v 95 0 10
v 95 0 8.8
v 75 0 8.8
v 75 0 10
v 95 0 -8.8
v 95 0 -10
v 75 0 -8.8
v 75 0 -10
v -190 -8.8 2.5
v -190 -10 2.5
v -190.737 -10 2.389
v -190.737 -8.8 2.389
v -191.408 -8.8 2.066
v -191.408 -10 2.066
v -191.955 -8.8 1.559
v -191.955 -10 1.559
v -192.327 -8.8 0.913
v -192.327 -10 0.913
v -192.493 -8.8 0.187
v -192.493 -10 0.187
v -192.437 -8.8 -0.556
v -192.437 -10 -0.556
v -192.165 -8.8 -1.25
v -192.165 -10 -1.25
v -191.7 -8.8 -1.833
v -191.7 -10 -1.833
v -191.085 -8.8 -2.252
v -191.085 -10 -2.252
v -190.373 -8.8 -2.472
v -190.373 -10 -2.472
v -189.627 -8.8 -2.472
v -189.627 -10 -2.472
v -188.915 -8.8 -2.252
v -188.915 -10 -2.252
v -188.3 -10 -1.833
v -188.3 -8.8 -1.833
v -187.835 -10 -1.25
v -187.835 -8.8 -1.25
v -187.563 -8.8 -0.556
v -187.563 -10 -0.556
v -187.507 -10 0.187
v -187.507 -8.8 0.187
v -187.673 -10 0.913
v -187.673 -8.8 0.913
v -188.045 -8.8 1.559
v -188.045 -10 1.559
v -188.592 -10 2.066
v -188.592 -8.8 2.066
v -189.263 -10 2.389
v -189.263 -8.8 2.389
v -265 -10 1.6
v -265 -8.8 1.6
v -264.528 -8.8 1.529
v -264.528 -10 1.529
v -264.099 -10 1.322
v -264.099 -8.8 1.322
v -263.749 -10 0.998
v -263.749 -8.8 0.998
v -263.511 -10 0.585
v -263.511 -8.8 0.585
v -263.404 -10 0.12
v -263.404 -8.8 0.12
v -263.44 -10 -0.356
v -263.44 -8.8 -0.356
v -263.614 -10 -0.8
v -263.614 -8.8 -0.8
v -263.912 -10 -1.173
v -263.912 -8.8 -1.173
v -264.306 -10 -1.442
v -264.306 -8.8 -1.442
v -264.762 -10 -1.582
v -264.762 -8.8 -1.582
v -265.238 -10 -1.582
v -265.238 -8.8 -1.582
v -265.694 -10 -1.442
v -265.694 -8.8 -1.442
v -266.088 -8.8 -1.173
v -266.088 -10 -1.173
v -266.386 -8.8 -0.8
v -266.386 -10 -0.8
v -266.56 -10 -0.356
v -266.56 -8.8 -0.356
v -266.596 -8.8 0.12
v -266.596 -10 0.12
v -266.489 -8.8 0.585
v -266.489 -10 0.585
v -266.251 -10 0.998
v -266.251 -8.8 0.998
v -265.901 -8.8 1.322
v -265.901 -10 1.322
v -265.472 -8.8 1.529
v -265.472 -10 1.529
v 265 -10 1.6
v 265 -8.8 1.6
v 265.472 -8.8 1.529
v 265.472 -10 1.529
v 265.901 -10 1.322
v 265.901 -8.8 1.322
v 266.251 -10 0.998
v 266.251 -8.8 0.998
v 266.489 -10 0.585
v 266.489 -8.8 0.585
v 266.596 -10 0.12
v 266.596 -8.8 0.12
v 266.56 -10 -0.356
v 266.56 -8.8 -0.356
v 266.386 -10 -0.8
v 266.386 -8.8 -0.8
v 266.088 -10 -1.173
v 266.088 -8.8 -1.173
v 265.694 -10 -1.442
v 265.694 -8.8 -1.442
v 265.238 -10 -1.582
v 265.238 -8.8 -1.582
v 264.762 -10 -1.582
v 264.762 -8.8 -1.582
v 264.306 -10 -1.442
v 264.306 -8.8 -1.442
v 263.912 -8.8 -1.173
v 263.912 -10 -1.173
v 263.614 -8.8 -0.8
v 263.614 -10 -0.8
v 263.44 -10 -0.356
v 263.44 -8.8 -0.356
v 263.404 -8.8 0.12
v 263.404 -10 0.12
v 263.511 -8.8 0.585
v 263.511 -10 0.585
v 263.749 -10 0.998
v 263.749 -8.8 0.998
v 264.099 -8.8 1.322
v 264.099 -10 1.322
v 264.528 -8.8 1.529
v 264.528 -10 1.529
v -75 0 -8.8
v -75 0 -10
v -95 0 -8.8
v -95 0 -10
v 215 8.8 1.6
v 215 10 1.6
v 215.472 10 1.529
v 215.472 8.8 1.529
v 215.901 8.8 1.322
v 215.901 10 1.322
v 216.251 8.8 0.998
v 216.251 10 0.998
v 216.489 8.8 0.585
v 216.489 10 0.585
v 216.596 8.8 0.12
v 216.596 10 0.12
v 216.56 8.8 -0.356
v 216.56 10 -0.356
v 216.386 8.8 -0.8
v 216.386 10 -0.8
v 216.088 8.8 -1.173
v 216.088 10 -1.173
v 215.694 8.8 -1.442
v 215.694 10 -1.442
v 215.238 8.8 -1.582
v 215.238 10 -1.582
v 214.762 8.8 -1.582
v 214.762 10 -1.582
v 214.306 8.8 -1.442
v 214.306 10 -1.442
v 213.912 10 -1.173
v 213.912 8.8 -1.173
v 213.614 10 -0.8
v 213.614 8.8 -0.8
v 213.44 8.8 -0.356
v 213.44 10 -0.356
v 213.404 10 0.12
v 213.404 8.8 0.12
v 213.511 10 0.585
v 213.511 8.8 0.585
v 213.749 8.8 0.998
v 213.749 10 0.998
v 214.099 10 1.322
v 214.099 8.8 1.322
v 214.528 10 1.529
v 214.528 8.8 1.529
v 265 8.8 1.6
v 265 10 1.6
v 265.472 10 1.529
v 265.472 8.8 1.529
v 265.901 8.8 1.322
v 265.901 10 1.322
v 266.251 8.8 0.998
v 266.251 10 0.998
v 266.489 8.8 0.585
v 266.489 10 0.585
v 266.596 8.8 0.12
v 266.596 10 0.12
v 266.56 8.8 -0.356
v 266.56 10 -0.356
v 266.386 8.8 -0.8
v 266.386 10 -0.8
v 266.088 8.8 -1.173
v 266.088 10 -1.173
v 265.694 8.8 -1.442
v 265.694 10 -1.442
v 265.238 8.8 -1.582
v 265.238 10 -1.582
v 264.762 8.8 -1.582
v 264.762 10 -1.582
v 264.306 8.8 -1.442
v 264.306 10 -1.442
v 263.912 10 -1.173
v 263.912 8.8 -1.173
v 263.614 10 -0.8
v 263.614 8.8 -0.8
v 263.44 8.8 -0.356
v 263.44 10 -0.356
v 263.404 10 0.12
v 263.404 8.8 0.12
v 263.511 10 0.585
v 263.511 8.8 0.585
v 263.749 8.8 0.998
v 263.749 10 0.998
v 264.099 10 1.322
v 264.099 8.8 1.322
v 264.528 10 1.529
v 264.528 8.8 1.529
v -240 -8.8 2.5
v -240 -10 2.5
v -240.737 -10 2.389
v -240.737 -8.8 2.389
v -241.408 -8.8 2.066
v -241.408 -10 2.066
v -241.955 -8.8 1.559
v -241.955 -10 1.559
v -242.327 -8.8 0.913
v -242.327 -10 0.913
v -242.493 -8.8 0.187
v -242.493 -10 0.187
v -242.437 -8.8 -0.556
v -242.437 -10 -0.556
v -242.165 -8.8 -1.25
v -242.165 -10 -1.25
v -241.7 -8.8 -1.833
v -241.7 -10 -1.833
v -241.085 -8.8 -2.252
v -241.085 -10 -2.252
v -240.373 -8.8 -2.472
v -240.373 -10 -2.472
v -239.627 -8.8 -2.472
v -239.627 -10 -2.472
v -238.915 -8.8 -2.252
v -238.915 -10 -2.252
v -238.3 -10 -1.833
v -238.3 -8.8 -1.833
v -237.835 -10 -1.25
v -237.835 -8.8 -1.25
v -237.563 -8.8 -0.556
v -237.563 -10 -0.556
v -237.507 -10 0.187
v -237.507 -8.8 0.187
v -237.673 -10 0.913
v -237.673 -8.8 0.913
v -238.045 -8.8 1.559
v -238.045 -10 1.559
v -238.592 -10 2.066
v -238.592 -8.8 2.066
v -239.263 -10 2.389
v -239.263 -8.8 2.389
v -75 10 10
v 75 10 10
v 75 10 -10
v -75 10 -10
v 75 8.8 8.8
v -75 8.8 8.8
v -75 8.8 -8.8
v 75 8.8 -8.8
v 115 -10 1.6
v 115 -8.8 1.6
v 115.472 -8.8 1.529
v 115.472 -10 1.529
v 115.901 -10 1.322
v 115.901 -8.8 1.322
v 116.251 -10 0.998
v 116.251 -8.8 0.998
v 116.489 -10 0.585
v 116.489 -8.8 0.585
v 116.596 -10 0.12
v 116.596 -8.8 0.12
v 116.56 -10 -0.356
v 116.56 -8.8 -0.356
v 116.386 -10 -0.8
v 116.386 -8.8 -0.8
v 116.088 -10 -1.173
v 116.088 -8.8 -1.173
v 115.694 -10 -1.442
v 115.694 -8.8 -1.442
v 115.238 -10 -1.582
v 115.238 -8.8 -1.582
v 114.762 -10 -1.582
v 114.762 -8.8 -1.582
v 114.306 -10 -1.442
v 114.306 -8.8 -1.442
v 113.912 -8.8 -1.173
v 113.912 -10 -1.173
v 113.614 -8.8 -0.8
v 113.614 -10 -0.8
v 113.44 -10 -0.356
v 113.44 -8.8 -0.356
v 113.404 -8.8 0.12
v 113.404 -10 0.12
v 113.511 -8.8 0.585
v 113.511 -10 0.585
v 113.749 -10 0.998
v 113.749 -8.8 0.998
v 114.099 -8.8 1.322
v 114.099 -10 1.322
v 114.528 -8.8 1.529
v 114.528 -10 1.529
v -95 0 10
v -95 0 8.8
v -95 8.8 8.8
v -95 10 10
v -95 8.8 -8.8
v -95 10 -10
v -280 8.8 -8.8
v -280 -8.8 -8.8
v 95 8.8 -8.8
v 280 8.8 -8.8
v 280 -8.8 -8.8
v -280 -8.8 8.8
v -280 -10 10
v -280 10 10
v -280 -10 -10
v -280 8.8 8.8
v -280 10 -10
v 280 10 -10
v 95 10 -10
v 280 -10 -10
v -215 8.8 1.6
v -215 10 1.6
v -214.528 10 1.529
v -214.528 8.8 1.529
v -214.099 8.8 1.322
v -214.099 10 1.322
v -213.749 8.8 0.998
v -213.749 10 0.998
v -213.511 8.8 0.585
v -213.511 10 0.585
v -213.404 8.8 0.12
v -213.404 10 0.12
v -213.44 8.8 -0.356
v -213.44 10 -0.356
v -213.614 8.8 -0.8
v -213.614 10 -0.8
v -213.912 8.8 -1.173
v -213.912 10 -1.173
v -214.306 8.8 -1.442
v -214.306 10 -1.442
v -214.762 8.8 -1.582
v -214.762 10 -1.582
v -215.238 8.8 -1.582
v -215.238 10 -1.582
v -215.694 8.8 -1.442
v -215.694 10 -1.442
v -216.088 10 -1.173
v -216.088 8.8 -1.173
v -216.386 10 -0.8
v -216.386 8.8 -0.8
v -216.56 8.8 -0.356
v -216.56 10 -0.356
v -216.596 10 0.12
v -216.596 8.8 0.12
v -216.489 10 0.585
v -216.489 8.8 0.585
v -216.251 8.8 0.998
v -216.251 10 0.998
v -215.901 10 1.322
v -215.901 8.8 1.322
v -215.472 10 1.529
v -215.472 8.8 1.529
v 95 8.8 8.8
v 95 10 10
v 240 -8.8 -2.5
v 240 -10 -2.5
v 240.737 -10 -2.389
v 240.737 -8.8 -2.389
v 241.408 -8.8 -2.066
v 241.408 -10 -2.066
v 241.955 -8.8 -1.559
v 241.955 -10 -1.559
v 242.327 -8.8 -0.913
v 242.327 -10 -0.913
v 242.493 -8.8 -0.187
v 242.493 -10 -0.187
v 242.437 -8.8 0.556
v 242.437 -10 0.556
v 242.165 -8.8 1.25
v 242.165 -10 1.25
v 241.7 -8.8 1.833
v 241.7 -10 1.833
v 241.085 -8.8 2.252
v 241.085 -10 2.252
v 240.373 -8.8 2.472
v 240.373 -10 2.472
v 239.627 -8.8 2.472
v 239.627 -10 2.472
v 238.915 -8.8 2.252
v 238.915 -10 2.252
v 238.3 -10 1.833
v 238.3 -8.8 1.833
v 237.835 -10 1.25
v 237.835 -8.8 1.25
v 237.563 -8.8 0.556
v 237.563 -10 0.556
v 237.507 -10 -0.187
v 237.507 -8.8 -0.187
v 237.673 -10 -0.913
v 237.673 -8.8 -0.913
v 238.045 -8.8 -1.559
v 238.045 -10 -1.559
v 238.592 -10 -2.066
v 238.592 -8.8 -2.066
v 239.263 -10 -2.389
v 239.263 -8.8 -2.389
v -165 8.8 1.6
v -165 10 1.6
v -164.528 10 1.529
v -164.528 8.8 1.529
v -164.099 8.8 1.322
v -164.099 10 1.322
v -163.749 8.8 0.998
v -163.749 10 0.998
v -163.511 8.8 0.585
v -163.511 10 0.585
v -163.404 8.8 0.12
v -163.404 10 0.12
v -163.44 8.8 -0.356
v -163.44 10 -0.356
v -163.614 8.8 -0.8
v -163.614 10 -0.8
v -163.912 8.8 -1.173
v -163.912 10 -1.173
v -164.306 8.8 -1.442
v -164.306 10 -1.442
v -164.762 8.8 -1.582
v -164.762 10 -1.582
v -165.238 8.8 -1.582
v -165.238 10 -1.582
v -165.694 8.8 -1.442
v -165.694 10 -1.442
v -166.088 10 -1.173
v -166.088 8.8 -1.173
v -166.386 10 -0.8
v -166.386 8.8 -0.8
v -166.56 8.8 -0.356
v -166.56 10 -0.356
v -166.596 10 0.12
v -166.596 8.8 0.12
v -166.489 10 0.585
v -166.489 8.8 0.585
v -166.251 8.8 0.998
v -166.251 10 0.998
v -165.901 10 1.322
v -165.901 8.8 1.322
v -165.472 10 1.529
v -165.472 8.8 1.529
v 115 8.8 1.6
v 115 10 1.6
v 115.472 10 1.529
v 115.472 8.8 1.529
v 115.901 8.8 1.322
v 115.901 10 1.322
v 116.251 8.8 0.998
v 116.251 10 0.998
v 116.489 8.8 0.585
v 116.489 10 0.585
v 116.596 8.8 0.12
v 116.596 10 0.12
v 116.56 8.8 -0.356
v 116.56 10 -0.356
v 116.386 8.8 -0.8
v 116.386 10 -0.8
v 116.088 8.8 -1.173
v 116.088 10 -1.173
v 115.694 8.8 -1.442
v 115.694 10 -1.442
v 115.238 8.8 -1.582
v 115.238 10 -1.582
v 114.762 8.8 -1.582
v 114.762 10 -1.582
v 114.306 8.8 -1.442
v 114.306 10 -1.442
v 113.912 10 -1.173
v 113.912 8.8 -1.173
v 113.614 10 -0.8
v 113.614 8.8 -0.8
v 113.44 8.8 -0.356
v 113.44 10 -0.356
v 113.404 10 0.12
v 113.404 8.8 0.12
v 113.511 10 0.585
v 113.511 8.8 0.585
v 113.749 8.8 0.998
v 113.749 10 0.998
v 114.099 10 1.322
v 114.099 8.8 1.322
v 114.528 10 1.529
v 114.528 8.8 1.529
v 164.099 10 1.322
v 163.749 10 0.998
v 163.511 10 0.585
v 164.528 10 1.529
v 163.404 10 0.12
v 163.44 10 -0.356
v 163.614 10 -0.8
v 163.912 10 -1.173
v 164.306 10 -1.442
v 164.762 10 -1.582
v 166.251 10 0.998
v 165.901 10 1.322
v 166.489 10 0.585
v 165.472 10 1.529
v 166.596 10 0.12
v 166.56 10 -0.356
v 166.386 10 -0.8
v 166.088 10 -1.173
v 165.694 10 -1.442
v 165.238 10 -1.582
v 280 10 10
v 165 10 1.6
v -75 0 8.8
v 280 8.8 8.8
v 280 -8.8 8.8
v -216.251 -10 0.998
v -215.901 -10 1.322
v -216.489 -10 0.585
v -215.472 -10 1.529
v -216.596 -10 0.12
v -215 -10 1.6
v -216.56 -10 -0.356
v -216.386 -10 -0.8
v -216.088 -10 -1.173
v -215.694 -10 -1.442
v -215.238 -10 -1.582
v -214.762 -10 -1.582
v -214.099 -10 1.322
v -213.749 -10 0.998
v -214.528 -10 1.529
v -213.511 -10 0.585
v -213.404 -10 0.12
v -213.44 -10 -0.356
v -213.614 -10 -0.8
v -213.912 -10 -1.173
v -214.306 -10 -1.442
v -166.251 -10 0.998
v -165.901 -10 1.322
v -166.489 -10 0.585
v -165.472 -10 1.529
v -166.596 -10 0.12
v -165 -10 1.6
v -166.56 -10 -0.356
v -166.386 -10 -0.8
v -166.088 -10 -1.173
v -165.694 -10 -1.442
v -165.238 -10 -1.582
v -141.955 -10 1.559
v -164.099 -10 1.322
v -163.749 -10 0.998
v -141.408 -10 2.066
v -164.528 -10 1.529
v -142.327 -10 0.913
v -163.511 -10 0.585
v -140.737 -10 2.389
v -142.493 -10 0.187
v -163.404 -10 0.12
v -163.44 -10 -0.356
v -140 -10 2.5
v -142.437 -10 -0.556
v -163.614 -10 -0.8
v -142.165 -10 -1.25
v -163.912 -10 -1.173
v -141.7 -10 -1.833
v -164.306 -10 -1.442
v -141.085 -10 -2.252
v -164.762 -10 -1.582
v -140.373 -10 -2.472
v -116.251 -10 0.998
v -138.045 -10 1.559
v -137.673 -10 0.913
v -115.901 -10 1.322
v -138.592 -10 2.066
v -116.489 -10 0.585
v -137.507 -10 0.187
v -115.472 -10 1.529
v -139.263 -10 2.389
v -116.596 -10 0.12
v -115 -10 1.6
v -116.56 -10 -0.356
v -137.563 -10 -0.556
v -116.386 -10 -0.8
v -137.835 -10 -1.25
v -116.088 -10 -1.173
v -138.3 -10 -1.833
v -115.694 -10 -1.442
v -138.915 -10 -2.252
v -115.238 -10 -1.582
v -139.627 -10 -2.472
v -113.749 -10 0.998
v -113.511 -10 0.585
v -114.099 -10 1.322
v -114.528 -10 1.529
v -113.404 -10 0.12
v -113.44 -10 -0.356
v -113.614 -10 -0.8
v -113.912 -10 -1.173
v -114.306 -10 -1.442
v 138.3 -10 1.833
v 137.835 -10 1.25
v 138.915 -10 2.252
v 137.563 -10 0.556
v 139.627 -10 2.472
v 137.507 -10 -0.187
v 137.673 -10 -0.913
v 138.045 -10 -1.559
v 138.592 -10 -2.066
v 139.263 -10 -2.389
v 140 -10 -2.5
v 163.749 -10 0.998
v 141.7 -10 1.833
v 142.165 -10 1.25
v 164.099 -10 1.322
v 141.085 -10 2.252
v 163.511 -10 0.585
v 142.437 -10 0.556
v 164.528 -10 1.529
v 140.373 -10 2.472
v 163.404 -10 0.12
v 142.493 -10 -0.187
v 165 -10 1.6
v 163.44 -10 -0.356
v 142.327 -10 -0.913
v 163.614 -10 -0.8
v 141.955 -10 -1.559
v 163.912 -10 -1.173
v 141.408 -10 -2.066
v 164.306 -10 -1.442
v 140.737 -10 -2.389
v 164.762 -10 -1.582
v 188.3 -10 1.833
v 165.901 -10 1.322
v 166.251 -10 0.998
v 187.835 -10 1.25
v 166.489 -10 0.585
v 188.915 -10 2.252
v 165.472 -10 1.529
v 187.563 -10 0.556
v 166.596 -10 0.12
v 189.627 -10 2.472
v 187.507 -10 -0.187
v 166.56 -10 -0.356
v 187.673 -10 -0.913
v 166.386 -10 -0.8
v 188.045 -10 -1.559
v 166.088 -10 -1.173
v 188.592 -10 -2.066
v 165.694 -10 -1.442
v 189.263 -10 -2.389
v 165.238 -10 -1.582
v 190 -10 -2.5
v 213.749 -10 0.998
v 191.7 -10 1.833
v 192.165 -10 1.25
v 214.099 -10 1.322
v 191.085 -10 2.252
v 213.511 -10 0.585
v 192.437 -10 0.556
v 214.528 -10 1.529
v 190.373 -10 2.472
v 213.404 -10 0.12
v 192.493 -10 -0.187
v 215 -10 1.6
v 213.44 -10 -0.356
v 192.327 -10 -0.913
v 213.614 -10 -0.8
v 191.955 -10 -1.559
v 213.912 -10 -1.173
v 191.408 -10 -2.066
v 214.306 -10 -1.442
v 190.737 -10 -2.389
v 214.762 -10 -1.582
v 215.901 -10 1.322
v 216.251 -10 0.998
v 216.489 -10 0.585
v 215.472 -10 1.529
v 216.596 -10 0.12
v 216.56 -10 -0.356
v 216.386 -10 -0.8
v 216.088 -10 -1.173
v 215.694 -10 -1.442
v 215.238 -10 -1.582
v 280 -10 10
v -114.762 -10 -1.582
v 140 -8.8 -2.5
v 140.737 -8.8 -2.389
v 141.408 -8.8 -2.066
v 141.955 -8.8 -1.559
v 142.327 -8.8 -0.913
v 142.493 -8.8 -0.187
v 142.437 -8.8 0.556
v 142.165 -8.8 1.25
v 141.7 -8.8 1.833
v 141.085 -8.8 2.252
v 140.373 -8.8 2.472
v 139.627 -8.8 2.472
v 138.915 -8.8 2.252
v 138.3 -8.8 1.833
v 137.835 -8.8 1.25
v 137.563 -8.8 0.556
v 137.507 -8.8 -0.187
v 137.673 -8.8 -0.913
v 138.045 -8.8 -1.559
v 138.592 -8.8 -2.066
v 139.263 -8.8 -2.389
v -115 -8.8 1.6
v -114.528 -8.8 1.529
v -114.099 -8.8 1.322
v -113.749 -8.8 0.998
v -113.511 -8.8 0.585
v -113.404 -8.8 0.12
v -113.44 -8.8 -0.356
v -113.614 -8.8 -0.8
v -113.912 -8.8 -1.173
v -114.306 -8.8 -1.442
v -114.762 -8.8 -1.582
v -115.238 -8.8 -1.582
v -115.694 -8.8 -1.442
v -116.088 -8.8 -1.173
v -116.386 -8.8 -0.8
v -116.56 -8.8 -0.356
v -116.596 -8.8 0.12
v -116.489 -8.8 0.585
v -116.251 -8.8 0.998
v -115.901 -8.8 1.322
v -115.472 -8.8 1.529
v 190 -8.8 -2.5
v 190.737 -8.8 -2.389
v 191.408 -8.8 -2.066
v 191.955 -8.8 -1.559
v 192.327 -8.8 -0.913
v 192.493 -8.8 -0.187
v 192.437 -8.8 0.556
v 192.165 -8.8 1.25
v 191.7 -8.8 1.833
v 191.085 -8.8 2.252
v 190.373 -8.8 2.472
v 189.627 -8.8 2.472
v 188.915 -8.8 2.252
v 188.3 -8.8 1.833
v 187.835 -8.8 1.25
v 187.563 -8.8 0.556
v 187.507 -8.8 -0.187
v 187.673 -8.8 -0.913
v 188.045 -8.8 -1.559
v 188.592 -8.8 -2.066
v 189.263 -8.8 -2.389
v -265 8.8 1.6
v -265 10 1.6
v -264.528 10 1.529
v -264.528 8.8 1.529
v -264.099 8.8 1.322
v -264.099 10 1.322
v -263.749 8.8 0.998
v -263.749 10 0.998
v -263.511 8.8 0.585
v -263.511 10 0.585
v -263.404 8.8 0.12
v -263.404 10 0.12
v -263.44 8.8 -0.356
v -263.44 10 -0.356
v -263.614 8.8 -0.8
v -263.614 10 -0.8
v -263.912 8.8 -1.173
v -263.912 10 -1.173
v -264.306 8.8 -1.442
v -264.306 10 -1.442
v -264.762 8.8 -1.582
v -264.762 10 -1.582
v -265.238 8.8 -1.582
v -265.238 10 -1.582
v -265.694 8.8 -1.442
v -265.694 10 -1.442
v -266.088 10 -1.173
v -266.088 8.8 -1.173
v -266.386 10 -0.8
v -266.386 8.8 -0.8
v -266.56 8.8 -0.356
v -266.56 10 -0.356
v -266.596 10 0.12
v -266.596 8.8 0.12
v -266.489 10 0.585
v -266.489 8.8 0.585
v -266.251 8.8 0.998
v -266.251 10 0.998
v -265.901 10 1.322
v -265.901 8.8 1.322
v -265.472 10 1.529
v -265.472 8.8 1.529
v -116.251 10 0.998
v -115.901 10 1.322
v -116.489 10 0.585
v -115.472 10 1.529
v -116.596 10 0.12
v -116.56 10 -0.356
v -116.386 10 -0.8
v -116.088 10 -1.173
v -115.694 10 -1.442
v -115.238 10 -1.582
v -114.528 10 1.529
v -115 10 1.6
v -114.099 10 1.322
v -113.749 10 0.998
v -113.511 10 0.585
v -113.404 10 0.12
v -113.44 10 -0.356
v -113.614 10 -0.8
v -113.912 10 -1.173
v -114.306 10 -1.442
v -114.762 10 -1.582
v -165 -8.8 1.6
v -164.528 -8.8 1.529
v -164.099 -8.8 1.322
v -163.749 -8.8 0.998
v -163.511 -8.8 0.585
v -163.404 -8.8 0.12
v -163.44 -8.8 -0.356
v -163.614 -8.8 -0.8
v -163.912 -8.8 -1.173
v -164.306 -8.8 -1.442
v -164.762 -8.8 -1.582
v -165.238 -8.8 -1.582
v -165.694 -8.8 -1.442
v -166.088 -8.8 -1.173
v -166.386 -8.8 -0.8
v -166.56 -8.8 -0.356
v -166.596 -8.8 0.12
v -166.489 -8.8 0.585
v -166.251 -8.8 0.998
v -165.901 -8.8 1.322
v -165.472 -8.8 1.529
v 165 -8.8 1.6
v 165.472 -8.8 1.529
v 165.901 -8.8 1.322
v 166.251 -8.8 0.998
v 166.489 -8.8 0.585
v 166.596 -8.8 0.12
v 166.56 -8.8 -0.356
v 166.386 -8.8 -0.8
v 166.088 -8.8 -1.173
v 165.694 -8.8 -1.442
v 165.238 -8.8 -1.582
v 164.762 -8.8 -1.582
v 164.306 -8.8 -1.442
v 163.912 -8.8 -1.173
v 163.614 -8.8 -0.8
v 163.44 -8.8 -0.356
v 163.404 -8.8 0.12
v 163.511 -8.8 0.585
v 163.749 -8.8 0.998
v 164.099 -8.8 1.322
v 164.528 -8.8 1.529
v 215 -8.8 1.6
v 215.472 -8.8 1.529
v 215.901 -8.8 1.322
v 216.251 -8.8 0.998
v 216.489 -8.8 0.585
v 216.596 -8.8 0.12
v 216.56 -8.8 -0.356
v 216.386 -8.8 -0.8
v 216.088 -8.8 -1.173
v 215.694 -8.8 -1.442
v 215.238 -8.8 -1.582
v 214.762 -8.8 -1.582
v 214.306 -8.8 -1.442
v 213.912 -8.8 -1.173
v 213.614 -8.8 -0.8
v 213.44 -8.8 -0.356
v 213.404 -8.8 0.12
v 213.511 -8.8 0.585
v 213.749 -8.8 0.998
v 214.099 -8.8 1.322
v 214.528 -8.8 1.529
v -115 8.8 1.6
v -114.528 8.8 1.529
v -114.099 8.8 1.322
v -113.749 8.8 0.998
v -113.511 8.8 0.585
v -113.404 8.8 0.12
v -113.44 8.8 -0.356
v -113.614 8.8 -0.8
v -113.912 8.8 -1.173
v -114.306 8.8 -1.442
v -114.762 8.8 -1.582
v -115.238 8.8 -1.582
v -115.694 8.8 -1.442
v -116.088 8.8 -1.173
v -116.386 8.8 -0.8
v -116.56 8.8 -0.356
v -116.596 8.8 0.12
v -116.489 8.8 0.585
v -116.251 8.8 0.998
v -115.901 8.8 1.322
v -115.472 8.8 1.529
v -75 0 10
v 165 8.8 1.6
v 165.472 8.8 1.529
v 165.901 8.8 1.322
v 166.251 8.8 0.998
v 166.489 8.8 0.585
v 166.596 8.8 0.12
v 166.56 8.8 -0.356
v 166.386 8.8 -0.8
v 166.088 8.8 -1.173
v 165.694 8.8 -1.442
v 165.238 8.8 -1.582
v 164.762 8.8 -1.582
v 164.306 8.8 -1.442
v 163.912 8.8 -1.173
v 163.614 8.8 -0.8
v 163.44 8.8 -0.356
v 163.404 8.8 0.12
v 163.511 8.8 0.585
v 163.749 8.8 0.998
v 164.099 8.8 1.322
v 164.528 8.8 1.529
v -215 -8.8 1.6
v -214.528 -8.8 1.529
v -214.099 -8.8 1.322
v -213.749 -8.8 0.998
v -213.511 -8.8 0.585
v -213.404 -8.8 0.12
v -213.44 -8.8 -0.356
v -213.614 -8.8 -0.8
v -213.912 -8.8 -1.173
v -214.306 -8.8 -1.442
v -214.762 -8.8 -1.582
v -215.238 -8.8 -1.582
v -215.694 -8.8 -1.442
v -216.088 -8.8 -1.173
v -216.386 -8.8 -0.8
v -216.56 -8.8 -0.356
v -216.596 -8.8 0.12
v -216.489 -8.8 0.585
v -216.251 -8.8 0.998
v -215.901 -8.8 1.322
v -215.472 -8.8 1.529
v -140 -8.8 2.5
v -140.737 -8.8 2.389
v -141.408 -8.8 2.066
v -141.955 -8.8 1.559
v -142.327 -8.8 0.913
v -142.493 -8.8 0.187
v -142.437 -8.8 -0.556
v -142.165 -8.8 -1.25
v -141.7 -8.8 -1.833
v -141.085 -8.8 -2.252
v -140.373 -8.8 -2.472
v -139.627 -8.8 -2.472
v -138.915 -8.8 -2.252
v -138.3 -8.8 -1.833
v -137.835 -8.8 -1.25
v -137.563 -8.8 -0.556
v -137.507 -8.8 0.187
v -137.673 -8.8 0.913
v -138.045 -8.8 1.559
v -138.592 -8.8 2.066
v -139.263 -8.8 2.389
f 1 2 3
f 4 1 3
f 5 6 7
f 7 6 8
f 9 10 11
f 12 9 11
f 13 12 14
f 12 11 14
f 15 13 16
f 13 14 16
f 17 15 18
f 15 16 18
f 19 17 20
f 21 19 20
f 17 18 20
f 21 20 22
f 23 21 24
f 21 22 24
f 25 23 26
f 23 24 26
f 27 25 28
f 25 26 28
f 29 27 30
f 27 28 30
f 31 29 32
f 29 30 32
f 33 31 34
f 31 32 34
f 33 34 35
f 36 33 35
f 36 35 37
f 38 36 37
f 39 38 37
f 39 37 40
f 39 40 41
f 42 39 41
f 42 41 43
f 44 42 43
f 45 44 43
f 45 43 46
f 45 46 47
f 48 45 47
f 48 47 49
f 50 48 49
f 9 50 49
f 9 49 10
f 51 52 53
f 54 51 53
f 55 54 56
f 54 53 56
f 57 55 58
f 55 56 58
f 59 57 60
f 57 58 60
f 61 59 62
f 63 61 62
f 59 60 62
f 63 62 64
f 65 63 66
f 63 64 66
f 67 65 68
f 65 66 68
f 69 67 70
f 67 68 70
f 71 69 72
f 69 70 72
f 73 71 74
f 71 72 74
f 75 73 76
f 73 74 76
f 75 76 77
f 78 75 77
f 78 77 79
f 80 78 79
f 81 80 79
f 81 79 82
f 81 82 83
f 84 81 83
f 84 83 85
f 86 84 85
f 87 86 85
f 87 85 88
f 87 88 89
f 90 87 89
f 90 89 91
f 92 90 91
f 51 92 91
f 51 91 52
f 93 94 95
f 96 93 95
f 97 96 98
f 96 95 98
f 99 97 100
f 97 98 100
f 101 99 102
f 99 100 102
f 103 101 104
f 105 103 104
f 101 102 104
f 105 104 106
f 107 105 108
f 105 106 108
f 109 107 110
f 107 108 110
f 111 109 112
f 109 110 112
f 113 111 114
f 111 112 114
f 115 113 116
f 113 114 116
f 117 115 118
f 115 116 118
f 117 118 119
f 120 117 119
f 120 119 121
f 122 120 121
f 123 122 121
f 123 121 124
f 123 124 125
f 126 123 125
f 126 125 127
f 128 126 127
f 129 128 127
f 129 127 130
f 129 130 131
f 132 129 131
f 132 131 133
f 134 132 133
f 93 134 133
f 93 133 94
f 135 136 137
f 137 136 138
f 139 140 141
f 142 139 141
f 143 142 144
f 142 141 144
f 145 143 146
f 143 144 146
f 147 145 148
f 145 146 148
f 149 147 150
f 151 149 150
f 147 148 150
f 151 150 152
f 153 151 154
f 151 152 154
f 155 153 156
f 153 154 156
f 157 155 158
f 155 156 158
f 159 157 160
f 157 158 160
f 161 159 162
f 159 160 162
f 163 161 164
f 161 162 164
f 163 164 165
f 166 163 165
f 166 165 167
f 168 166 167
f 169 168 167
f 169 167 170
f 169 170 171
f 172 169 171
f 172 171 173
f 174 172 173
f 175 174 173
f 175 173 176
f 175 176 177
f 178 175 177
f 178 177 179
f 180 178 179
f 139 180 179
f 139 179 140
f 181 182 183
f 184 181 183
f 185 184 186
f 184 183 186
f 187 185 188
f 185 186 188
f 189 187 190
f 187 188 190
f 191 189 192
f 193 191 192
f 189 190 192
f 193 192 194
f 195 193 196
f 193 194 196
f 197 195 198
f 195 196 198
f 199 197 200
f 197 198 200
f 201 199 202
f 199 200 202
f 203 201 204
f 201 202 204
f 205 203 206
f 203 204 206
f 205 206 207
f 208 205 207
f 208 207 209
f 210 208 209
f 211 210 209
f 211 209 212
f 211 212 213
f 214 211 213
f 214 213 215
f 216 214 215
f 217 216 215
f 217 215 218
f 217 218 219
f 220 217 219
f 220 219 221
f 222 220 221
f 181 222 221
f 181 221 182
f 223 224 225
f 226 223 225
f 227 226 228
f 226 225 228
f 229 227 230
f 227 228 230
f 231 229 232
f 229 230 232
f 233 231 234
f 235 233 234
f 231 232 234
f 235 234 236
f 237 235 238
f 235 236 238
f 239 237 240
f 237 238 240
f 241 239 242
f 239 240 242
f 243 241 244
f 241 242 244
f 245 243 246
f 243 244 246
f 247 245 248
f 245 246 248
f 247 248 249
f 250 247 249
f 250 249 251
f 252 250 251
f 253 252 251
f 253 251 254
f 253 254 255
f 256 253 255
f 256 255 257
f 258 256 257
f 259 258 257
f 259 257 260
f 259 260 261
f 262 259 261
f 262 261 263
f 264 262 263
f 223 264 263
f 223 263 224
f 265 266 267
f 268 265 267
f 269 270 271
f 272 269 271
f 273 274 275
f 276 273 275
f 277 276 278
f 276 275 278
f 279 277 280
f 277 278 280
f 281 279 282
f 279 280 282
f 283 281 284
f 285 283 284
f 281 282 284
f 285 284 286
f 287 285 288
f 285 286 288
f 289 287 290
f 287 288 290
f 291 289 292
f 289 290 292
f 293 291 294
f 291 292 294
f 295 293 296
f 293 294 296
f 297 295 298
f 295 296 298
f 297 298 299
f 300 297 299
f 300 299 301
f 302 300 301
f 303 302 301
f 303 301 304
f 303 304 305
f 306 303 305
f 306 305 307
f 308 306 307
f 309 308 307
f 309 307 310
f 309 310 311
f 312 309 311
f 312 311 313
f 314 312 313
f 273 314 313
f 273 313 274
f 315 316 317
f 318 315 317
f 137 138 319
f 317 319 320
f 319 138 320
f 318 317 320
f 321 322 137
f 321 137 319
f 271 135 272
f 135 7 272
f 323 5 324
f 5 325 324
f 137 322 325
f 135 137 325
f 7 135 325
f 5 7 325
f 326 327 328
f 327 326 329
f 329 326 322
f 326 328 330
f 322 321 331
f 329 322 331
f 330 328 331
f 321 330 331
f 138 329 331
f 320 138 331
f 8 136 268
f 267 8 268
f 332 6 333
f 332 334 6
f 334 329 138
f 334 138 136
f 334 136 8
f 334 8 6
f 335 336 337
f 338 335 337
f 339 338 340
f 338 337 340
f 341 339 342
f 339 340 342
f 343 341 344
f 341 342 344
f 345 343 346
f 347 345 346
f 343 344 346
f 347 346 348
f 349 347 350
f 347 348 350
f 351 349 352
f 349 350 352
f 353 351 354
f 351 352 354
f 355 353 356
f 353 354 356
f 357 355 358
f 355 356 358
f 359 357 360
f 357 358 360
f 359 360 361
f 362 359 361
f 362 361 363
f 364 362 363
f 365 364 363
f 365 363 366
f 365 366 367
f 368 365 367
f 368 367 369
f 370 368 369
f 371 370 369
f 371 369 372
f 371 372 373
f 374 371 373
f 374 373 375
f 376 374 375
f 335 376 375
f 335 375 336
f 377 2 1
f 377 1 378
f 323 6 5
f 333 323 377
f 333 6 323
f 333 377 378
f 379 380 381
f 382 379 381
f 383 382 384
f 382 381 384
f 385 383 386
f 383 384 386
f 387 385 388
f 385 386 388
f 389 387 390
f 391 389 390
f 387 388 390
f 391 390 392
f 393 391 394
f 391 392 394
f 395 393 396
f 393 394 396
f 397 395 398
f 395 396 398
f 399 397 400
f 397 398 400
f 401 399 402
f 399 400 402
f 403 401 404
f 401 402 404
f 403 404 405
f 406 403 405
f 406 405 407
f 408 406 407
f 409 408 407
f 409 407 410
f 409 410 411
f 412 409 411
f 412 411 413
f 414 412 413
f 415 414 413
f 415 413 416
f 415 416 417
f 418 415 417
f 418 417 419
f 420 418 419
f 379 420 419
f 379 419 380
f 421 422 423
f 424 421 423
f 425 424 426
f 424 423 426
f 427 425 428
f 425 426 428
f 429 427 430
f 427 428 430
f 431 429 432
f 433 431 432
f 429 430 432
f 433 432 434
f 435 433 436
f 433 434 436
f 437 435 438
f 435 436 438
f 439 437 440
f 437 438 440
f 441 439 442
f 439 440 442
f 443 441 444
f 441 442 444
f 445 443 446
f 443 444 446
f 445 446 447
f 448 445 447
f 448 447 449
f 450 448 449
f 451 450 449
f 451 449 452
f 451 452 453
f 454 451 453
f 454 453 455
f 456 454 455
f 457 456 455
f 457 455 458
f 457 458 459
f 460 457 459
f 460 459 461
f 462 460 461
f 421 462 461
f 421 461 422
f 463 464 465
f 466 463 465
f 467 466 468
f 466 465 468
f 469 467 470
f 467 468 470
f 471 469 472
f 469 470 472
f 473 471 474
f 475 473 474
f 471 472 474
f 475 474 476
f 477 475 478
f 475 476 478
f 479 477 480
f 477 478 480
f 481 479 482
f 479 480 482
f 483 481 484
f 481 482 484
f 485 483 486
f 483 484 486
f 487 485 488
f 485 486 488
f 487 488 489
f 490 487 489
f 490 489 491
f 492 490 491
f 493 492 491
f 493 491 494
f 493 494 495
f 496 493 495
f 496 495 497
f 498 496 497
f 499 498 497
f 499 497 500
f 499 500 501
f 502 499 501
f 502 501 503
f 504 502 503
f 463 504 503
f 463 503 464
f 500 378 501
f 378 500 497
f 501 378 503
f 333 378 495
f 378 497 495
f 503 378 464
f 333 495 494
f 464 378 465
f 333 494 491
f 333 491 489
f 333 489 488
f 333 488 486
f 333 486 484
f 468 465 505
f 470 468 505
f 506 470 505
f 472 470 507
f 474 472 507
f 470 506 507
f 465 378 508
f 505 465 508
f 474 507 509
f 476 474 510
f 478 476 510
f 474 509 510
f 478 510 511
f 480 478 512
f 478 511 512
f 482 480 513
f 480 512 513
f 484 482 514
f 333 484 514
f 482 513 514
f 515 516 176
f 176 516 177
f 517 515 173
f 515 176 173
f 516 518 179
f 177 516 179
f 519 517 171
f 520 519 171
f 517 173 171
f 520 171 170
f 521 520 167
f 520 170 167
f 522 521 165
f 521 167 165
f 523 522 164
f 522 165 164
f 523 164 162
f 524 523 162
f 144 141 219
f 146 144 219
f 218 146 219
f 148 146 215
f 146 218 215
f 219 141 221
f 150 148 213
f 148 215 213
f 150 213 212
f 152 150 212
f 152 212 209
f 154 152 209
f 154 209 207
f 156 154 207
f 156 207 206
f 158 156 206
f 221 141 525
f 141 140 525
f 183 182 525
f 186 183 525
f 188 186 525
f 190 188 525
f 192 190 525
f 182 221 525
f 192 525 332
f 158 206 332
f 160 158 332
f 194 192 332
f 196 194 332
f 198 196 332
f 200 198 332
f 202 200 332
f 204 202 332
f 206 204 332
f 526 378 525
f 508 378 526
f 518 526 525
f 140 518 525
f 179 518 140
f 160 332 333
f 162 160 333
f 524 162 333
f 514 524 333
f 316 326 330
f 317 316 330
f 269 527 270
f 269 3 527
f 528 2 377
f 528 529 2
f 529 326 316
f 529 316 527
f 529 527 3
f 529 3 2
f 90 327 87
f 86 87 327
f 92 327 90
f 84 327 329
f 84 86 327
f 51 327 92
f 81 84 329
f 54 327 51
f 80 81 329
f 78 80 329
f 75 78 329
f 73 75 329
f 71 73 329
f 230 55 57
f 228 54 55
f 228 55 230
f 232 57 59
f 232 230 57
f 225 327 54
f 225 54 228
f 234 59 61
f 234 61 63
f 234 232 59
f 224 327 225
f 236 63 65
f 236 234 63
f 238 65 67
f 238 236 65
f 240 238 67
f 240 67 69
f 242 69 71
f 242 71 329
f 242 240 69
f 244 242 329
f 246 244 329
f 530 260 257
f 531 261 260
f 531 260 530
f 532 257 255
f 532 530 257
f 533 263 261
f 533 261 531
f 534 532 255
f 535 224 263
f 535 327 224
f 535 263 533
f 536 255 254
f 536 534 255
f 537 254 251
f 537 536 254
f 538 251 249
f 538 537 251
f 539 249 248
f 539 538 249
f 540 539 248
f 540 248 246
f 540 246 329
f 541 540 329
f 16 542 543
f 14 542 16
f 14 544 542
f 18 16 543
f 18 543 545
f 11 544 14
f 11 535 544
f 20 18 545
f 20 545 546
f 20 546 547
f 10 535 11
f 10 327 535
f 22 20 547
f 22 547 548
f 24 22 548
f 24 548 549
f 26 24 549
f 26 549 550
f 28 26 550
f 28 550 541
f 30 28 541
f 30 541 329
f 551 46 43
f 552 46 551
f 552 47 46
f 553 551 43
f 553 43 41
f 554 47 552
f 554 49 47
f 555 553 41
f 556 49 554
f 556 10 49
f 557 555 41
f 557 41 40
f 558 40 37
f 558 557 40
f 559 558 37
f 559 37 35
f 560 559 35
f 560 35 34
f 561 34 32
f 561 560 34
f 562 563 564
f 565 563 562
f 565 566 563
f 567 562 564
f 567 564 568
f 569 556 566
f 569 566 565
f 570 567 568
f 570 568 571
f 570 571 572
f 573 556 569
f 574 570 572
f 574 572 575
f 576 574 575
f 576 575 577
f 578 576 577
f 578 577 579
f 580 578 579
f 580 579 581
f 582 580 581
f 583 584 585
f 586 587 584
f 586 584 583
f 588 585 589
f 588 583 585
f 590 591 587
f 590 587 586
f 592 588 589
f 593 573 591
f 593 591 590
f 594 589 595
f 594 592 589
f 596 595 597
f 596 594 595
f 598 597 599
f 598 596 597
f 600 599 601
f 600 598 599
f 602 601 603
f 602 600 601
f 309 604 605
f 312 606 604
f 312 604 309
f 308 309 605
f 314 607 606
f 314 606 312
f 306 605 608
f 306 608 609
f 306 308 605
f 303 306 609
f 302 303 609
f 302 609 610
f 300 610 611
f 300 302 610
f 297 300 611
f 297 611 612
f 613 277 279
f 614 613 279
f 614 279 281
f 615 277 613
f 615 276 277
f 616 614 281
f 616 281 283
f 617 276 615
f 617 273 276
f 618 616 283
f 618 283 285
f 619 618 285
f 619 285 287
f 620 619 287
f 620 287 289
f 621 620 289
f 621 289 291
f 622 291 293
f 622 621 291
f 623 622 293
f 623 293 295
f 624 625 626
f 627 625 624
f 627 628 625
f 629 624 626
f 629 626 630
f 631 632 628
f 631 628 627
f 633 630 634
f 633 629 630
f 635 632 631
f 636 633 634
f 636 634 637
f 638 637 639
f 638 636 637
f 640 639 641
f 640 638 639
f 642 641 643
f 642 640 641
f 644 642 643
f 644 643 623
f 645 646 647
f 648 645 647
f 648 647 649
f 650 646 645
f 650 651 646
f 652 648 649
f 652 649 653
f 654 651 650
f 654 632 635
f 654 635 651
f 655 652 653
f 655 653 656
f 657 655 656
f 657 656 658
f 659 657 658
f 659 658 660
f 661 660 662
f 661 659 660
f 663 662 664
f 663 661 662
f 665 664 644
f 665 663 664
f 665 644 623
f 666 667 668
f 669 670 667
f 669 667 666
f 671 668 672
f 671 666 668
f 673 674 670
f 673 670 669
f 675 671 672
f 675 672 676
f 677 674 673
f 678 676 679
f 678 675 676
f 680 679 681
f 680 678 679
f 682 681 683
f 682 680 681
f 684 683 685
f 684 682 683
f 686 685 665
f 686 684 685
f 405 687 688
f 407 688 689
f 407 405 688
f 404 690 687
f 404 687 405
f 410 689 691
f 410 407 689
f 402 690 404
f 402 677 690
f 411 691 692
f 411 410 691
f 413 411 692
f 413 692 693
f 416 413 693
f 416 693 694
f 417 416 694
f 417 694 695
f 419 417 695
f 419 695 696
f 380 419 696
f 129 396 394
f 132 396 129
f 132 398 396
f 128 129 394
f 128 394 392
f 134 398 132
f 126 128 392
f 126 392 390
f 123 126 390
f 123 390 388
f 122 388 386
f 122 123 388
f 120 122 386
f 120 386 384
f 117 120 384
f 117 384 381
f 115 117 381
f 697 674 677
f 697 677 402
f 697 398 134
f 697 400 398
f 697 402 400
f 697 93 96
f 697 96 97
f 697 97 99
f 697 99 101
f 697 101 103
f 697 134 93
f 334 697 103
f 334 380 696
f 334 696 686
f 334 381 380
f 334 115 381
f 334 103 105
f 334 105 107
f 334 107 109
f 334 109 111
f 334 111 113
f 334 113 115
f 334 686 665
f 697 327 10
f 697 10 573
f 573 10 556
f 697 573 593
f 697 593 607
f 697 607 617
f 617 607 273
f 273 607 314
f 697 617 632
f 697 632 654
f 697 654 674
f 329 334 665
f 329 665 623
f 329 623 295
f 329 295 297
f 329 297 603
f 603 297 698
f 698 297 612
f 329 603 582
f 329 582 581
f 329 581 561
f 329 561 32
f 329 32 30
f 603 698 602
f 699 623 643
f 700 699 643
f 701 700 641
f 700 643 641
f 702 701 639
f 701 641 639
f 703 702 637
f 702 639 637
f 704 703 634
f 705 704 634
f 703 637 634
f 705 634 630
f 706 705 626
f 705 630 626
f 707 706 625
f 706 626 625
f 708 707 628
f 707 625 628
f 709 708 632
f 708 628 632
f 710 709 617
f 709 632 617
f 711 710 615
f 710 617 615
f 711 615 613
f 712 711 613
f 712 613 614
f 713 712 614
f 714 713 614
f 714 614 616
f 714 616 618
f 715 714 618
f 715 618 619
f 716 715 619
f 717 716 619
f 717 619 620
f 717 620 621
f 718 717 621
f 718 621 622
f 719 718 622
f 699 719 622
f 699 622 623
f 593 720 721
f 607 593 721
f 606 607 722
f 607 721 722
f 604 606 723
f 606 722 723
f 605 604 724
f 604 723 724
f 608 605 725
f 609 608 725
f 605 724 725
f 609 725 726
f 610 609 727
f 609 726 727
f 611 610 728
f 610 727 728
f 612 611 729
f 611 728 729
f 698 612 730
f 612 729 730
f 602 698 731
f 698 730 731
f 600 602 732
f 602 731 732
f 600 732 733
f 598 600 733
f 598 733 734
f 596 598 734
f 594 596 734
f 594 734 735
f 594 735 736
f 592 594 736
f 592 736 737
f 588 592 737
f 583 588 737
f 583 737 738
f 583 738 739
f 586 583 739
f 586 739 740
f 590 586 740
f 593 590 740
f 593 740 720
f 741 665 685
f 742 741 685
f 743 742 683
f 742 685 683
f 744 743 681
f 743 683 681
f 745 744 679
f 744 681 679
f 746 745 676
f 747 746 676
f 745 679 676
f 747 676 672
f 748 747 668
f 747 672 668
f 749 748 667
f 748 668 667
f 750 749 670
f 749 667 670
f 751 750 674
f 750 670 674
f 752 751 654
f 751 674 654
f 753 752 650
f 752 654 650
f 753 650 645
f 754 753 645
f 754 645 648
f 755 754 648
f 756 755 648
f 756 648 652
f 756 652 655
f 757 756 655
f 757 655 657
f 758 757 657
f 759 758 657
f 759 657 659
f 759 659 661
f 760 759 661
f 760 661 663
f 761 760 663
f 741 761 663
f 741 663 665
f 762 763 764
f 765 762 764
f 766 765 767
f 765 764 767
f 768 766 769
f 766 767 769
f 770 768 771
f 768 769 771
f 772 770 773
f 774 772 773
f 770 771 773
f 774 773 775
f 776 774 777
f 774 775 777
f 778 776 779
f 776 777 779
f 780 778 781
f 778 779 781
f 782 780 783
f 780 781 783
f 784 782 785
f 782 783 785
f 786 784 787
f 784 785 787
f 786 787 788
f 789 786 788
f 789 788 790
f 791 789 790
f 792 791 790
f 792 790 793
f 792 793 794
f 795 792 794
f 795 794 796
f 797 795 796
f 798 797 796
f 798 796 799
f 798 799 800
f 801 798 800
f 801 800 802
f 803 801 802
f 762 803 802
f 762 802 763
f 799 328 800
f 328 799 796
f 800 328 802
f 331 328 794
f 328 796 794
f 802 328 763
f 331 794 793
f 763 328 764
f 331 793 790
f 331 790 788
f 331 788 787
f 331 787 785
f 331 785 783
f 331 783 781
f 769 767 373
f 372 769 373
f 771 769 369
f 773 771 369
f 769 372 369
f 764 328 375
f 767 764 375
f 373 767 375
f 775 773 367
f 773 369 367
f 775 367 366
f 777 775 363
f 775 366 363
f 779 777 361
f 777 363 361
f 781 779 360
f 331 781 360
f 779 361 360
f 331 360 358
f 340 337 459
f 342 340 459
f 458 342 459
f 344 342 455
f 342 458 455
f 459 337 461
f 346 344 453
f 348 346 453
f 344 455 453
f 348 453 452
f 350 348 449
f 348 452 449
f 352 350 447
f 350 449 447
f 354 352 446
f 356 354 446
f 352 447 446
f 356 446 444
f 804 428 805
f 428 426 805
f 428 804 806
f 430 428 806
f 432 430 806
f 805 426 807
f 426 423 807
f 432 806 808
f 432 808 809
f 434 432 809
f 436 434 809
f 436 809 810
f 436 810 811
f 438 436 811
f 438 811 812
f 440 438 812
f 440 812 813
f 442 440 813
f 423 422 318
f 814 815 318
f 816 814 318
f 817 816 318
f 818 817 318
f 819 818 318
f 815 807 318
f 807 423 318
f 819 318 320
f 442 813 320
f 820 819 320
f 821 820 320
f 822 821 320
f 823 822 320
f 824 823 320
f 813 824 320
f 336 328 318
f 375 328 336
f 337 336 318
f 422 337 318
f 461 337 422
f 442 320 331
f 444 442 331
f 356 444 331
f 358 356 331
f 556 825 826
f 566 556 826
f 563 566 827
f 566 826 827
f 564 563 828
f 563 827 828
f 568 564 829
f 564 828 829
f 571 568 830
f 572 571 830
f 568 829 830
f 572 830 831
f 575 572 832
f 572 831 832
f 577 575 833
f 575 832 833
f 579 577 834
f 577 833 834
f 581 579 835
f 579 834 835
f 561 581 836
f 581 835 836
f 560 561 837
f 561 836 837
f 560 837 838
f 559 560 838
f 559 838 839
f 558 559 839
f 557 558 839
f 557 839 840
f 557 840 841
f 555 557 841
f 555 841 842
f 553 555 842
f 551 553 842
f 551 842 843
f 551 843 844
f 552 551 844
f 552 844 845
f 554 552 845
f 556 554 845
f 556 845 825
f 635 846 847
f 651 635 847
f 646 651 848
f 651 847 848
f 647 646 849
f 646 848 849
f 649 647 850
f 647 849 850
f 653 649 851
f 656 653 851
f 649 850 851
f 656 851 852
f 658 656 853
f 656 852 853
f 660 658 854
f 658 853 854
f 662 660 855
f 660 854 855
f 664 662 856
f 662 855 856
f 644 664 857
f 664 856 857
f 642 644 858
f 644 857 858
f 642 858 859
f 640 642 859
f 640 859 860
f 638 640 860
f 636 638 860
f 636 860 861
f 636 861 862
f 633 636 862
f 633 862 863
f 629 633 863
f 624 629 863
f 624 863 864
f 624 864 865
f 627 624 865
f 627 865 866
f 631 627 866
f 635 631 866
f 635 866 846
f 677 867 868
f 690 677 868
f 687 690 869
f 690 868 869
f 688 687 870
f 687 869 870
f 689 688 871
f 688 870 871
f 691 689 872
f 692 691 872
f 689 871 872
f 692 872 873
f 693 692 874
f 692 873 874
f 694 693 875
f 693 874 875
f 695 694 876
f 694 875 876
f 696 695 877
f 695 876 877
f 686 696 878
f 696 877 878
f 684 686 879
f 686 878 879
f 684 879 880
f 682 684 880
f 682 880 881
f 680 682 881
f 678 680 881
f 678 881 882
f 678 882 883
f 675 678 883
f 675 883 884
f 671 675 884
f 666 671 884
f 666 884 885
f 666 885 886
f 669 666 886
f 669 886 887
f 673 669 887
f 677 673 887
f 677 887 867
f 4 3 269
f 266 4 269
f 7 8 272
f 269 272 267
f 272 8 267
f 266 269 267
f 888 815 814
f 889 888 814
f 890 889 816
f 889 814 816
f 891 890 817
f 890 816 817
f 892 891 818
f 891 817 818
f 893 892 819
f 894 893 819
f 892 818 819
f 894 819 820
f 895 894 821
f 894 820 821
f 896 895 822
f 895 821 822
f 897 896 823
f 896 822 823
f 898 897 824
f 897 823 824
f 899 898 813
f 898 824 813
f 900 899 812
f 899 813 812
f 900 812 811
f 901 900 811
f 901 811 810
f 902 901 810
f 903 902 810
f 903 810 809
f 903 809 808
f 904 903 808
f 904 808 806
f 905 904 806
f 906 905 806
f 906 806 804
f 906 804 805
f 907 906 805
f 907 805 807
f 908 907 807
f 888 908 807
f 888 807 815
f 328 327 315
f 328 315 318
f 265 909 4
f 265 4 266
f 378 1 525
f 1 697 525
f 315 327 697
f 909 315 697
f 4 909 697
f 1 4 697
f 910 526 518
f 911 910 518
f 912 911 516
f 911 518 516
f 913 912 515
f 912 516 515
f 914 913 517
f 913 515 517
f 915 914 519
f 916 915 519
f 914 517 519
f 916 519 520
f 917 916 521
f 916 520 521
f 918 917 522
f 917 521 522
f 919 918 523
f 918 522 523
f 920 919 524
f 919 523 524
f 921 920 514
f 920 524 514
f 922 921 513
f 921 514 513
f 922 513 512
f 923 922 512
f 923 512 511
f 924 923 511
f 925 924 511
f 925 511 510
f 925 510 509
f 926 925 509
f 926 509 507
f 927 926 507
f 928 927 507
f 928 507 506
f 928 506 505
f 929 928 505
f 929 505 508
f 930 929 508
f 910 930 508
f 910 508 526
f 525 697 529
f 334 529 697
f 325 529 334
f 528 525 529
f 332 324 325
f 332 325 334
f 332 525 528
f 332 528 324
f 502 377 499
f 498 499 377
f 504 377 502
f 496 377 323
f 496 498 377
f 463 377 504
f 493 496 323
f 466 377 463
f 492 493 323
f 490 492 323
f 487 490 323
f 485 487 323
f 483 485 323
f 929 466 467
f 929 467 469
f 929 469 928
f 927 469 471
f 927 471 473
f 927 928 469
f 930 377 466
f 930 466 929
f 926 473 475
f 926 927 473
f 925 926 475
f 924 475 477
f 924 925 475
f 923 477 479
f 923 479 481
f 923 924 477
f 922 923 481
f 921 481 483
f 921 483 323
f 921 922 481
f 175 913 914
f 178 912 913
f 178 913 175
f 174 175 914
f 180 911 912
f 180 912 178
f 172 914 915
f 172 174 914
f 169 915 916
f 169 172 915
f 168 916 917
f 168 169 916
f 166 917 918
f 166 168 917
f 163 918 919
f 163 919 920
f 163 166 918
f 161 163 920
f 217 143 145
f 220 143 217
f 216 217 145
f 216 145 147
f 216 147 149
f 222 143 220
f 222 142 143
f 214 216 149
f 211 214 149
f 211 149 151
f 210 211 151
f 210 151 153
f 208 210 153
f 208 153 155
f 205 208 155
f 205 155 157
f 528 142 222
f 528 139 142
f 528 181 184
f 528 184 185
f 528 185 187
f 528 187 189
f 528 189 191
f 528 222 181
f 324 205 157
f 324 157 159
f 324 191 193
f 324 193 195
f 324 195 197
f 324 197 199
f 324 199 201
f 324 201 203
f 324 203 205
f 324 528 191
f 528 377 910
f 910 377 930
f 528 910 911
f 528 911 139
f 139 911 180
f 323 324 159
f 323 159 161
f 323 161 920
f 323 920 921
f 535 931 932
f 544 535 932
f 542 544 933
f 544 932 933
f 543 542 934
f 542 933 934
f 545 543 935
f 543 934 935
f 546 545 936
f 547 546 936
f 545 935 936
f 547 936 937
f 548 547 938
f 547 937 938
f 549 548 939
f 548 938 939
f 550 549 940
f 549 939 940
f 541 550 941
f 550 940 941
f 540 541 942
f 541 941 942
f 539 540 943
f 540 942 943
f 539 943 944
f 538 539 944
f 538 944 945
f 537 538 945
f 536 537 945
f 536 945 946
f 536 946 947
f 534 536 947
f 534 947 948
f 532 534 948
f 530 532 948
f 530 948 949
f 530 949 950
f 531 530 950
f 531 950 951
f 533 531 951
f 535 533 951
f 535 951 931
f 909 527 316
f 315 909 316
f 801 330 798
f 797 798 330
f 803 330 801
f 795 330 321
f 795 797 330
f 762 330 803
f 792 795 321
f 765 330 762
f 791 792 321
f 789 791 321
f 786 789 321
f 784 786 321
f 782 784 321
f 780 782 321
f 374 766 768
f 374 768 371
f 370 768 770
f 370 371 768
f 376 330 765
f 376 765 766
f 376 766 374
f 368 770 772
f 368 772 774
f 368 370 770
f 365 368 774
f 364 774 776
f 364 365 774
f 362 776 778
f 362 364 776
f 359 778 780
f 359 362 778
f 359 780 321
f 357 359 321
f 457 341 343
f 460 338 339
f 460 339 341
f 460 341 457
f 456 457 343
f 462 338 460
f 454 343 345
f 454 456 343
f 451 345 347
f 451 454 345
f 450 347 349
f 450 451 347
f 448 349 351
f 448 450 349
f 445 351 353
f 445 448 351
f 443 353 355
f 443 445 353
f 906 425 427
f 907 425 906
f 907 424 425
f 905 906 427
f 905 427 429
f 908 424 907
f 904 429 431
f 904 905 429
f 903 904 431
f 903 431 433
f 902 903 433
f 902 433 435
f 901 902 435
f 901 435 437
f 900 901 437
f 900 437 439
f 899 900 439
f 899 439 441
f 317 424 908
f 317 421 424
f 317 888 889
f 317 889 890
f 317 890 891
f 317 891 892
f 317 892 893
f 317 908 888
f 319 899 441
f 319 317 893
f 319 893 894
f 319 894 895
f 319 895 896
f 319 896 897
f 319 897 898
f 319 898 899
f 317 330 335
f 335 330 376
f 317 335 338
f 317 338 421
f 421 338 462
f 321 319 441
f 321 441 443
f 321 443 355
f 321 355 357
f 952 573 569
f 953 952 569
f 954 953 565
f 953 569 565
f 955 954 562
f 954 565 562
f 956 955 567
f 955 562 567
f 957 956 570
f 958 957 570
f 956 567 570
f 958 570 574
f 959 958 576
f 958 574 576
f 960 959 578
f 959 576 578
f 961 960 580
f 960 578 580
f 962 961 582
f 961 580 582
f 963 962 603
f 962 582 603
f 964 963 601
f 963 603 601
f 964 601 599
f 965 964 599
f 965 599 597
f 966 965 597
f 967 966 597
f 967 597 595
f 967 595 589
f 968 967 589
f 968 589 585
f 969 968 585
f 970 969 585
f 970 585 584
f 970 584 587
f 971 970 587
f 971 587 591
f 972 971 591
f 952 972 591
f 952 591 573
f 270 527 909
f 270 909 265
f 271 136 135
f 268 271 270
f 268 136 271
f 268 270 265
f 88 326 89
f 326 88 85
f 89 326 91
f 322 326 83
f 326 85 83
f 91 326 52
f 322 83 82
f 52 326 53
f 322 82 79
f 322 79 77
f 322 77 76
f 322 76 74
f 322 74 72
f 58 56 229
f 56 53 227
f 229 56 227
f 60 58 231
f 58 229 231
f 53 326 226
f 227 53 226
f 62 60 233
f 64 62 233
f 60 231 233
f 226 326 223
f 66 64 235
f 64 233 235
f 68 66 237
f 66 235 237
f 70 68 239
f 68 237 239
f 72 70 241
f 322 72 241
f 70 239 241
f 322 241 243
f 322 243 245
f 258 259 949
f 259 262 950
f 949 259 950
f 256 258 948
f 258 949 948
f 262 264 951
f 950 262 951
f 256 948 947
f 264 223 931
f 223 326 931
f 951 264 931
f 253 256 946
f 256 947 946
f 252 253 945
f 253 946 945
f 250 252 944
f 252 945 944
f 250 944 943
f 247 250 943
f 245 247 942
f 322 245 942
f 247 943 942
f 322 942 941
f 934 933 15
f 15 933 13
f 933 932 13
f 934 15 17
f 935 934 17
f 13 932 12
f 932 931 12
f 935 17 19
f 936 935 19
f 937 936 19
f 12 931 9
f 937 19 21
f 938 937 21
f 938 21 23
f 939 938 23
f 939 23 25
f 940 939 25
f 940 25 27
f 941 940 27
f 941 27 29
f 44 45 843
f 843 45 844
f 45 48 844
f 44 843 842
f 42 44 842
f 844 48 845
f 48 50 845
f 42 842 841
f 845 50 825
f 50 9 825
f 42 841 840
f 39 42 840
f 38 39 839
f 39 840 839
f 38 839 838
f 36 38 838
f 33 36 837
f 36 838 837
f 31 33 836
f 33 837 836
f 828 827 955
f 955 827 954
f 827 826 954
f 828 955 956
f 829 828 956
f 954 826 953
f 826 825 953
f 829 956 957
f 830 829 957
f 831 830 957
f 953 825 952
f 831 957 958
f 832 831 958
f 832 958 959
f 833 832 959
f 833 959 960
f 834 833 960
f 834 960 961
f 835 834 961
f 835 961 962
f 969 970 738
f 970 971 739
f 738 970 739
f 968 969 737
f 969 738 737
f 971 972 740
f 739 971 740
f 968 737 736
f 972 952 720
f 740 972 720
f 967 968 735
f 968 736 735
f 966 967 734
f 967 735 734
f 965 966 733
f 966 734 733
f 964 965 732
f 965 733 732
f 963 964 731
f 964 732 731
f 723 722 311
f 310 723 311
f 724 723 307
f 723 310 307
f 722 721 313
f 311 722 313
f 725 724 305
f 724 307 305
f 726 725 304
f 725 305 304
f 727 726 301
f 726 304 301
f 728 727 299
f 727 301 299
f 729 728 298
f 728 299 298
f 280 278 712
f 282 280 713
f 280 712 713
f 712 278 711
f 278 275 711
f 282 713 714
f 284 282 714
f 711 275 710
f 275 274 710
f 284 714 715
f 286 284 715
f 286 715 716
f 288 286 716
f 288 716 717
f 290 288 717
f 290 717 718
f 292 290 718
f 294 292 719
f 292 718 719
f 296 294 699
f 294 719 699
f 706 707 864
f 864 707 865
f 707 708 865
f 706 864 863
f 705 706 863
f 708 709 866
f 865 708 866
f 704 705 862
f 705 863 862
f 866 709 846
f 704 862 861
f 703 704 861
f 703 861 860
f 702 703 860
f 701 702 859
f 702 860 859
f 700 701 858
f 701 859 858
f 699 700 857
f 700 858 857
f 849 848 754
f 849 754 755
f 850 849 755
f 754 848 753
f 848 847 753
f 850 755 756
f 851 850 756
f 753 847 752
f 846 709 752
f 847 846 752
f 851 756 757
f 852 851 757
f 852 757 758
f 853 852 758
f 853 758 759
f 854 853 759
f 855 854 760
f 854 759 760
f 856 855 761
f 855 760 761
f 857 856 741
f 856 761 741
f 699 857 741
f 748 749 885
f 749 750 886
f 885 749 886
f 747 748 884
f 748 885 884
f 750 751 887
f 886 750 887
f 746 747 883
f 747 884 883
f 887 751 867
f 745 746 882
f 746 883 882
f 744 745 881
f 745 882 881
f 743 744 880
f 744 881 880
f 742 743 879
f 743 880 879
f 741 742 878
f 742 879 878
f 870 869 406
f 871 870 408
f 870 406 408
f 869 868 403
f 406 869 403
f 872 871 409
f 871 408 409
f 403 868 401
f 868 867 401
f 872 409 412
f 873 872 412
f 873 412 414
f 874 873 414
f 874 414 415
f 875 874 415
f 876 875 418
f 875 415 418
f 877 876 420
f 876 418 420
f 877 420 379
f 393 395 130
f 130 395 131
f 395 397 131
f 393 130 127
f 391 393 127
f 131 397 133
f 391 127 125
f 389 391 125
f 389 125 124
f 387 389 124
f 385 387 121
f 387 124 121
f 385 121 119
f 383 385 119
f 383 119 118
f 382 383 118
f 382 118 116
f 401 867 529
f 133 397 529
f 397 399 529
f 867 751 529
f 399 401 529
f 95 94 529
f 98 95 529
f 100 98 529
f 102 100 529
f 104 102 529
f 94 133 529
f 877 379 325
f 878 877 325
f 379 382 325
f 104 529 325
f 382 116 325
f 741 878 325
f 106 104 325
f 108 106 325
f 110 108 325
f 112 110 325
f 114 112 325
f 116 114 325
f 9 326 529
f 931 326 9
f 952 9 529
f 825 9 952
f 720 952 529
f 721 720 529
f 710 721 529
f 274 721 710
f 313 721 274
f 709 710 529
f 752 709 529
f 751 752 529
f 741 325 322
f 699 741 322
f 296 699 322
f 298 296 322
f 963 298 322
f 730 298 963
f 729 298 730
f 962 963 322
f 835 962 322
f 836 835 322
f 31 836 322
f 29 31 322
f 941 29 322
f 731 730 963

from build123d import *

# Parameters (mm, degrees)
SKETCH_1_W          = 20
SKETCH_1_H          = 20
SKETCH_1_W_2        = 17.6
SKETCH_1_H_2        = 17.6
EXTRUDE_1_DEPTH     = 280
SKETCH_2_W          = 20
SKETCH_2_H          = 10
CUT_EXTRUDE_1_DEPTH = 281.891438104
SKETCH_3_R          = 1.6
CUT_EXTRUDE_2_DEPTH = 281.891438104
CUT_EXTRUDE_3_REACH = 282.891
SKETCH_4_R          = 2.5


with BuildPart() as part:
    # 草图1 → 凸台-拉伸1 (new, symmetric)
    with BuildSketch(Plane(origin=(0, 0, 0), x_dir=(0, 0, -1), z_dir=(1, 0, 0))):
        Rectangle(SKETCH_1_W, SKETCH_1_H)
        Rectangle(SKETCH_1_W_2, SKETCH_1_H_2, mode=Mode.SUBTRACT)
    extrude(amount=EXTRUDE_1_DEPTH, both=True)

    # 草图2 → 切除-拉伸1 (cut, through all)
    with BuildSketch(Plane(origin=(0, 0, -10), x_dir=(-1, 0, 0), z_dir=(0, 0, -1))):
        with Locations((-85, 5)):
            Rectangle(SKETCH_2_W, SKETCH_2_H)
        with Locations((85, 5)):
            Rectangle(SKETCH_2_W, SKETCH_2_H)
    extrude(amount=-CUT_EXTRUDE_1_DEPTH, mode=Mode.SUBTRACT)

    # 草图3 → 切除-拉伸2 (cut, through all)
    with BuildSketch(Plane(origin=(0, 10, 0), x_dir=(1, 0, 0), z_dir=(0, 1, 0))):
        with Locations(Location((115, 0, 0), (0, 0, 270))):
            Circle(SKETCH_3_R)
        with Locations(Location((165, 0, 0), (0, 0, 270))):
            Circle(SKETCH_3_R)
        with Locations(Location((265, 0, 0), (0, 0, 270))):
            Circle(SKETCH_3_R)
        with Locations(Location((215, 0, 0), (0, 0, 270))):
            Circle(SKETCH_3_R)
        with Locations(Location((-215, 0, 0), (0, 0, 270))):
            Circle(SKETCH_3_R)
        with Locations(Location((-265, 0, 0), (0, 0, 270))):
            Circle(SKETCH_3_R)
        with Locations(Location((-115, 0, 0), (0, 0, 270))):
            Circle(SKETCH_3_R)
        with Locations(Location((-165, 0, 0), (0, 0, 270))):
            Circle(SKETCH_3_R)
    extrude(amount=-CUT_EXTRUDE_2_DEPTH, mode=Mode.SUBTRACT)

    # 草图4 → 切除-拉伸3 (cut, up to next)
    with BuildSketch(Plane.XZ.offset(10), mode=Mode.PRIVATE) as cut_extrude_3_sk1:
        with Locations(Location((240, 0, 0), (0, 0, 270))):
            Circle(SKETCH_4_R)
    cut_extrude_3_tool1 = extrude(cut_extrude_3_sk1.sketch, amount=-CUT_EXTRUDE_3_REACH, mode=Mode.PRIVATE) & part.part
    # 草图4 → 切除-拉伸3 (cut, up to next)
    with BuildSketch(Plane.XZ.offset(10), mode=Mode.PRIVATE) as cut_extrude_3_sk2:
        with Locations(Location((-240, 0, 0), (0, 0, 90))):
            Circle(SKETCH_4_R)
    cut_extrude_3_tool2 = extrude(cut_extrude_3_sk2.sketch, amount=-CUT_EXTRUDE_3_REACH, mode=Mode.PRIVATE) & part.part
    # 草图4 → 切除-拉伸3 (cut, up to next)
    with BuildSketch(Plane.XZ.offset(10), mode=Mode.PRIVATE) as cut_extrude_3_sk3:
        with Locations(Location((190, 0, 0), (0, 0, 270))):
            Circle(SKETCH_4_R)
    cut_extrude_3_tool3 = extrude(cut_extrude_3_sk3.sketch, amount=-CUT_EXTRUDE_3_REACH, mode=Mode.PRIVATE) & part.part
    # 草图4 → 切除-拉伸3 (cut, up to next)
    with BuildSketch(Plane.XZ.offset(10), mode=Mode.PRIVATE) as cut_extrude_3_sk4:
        with Locations(Location((140, 0, 0), (0, 0, 270))):
            Circle(SKETCH_4_R)
    cut_extrude_3_tool4 = extrude(cut_extrude_3_sk4.sketch, amount=-CUT_EXTRUDE_3_REACH, mode=Mode.PRIVATE) & part.part
    # 草图4 → 切除-拉伸3 (cut, up to next)
    with BuildSketch(Plane.XZ.offset(10), mode=Mode.PRIVATE) as cut_extrude_3_sk5:
        with Locations(Location((-140, 0, 0), (0, 0, 90))):
            Circle(SKETCH_4_R)
    cut_extrude_3_tool5 = extrude(cut_extrude_3_sk5.sketch, amount=-CUT_EXTRUDE_3_REACH, mode=Mode.PRIVATE) & part.part
    # 草图4 → 切除-拉伸3 (cut, up to next)
    with BuildSketch(Plane.XZ.offset(10), mode=Mode.PRIVATE) as cut_extrude_3_sk6:
        with Locations(Location((-190, 0, 0), (0, 0, 90))):
            Circle(SKETCH_4_R)
    cut_extrude_3_tool6 = extrude(cut_extrude_3_sk6.sketch, amount=-CUT_EXTRUDE_3_REACH, mode=Mode.PRIVATE) & part.part
    add(cut_extrude_3_tool1.solids().sort_by_distance((240, -10, 0))[0], mode=Mode.SUBTRACT)
    add(cut_extrude_3_tool2.solids().sort_by_distance((-240, -10, 0))[0], mode=Mode.SUBTRACT)
    add(cut_extrude_3_tool3.solids().sort_by_distance((190, -10, 0))[0], mode=Mode.SUBTRACT)
    add(cut_extrude_3_tool4.solids().sort_by_distance((140, -10, 0))[0], mode=Mode.SUBTRACT)
    add(cut_extrude_3_tool5.solids().sort_by_distance((-140, -10, 0))[0], mode=Mode.SUBTRACT)
    add(cut_extrude_3_tool6.solids().sort_by_distance((-190, -10, 0))[0], mode=Mode.SUBTRACT)


solid = part.part
